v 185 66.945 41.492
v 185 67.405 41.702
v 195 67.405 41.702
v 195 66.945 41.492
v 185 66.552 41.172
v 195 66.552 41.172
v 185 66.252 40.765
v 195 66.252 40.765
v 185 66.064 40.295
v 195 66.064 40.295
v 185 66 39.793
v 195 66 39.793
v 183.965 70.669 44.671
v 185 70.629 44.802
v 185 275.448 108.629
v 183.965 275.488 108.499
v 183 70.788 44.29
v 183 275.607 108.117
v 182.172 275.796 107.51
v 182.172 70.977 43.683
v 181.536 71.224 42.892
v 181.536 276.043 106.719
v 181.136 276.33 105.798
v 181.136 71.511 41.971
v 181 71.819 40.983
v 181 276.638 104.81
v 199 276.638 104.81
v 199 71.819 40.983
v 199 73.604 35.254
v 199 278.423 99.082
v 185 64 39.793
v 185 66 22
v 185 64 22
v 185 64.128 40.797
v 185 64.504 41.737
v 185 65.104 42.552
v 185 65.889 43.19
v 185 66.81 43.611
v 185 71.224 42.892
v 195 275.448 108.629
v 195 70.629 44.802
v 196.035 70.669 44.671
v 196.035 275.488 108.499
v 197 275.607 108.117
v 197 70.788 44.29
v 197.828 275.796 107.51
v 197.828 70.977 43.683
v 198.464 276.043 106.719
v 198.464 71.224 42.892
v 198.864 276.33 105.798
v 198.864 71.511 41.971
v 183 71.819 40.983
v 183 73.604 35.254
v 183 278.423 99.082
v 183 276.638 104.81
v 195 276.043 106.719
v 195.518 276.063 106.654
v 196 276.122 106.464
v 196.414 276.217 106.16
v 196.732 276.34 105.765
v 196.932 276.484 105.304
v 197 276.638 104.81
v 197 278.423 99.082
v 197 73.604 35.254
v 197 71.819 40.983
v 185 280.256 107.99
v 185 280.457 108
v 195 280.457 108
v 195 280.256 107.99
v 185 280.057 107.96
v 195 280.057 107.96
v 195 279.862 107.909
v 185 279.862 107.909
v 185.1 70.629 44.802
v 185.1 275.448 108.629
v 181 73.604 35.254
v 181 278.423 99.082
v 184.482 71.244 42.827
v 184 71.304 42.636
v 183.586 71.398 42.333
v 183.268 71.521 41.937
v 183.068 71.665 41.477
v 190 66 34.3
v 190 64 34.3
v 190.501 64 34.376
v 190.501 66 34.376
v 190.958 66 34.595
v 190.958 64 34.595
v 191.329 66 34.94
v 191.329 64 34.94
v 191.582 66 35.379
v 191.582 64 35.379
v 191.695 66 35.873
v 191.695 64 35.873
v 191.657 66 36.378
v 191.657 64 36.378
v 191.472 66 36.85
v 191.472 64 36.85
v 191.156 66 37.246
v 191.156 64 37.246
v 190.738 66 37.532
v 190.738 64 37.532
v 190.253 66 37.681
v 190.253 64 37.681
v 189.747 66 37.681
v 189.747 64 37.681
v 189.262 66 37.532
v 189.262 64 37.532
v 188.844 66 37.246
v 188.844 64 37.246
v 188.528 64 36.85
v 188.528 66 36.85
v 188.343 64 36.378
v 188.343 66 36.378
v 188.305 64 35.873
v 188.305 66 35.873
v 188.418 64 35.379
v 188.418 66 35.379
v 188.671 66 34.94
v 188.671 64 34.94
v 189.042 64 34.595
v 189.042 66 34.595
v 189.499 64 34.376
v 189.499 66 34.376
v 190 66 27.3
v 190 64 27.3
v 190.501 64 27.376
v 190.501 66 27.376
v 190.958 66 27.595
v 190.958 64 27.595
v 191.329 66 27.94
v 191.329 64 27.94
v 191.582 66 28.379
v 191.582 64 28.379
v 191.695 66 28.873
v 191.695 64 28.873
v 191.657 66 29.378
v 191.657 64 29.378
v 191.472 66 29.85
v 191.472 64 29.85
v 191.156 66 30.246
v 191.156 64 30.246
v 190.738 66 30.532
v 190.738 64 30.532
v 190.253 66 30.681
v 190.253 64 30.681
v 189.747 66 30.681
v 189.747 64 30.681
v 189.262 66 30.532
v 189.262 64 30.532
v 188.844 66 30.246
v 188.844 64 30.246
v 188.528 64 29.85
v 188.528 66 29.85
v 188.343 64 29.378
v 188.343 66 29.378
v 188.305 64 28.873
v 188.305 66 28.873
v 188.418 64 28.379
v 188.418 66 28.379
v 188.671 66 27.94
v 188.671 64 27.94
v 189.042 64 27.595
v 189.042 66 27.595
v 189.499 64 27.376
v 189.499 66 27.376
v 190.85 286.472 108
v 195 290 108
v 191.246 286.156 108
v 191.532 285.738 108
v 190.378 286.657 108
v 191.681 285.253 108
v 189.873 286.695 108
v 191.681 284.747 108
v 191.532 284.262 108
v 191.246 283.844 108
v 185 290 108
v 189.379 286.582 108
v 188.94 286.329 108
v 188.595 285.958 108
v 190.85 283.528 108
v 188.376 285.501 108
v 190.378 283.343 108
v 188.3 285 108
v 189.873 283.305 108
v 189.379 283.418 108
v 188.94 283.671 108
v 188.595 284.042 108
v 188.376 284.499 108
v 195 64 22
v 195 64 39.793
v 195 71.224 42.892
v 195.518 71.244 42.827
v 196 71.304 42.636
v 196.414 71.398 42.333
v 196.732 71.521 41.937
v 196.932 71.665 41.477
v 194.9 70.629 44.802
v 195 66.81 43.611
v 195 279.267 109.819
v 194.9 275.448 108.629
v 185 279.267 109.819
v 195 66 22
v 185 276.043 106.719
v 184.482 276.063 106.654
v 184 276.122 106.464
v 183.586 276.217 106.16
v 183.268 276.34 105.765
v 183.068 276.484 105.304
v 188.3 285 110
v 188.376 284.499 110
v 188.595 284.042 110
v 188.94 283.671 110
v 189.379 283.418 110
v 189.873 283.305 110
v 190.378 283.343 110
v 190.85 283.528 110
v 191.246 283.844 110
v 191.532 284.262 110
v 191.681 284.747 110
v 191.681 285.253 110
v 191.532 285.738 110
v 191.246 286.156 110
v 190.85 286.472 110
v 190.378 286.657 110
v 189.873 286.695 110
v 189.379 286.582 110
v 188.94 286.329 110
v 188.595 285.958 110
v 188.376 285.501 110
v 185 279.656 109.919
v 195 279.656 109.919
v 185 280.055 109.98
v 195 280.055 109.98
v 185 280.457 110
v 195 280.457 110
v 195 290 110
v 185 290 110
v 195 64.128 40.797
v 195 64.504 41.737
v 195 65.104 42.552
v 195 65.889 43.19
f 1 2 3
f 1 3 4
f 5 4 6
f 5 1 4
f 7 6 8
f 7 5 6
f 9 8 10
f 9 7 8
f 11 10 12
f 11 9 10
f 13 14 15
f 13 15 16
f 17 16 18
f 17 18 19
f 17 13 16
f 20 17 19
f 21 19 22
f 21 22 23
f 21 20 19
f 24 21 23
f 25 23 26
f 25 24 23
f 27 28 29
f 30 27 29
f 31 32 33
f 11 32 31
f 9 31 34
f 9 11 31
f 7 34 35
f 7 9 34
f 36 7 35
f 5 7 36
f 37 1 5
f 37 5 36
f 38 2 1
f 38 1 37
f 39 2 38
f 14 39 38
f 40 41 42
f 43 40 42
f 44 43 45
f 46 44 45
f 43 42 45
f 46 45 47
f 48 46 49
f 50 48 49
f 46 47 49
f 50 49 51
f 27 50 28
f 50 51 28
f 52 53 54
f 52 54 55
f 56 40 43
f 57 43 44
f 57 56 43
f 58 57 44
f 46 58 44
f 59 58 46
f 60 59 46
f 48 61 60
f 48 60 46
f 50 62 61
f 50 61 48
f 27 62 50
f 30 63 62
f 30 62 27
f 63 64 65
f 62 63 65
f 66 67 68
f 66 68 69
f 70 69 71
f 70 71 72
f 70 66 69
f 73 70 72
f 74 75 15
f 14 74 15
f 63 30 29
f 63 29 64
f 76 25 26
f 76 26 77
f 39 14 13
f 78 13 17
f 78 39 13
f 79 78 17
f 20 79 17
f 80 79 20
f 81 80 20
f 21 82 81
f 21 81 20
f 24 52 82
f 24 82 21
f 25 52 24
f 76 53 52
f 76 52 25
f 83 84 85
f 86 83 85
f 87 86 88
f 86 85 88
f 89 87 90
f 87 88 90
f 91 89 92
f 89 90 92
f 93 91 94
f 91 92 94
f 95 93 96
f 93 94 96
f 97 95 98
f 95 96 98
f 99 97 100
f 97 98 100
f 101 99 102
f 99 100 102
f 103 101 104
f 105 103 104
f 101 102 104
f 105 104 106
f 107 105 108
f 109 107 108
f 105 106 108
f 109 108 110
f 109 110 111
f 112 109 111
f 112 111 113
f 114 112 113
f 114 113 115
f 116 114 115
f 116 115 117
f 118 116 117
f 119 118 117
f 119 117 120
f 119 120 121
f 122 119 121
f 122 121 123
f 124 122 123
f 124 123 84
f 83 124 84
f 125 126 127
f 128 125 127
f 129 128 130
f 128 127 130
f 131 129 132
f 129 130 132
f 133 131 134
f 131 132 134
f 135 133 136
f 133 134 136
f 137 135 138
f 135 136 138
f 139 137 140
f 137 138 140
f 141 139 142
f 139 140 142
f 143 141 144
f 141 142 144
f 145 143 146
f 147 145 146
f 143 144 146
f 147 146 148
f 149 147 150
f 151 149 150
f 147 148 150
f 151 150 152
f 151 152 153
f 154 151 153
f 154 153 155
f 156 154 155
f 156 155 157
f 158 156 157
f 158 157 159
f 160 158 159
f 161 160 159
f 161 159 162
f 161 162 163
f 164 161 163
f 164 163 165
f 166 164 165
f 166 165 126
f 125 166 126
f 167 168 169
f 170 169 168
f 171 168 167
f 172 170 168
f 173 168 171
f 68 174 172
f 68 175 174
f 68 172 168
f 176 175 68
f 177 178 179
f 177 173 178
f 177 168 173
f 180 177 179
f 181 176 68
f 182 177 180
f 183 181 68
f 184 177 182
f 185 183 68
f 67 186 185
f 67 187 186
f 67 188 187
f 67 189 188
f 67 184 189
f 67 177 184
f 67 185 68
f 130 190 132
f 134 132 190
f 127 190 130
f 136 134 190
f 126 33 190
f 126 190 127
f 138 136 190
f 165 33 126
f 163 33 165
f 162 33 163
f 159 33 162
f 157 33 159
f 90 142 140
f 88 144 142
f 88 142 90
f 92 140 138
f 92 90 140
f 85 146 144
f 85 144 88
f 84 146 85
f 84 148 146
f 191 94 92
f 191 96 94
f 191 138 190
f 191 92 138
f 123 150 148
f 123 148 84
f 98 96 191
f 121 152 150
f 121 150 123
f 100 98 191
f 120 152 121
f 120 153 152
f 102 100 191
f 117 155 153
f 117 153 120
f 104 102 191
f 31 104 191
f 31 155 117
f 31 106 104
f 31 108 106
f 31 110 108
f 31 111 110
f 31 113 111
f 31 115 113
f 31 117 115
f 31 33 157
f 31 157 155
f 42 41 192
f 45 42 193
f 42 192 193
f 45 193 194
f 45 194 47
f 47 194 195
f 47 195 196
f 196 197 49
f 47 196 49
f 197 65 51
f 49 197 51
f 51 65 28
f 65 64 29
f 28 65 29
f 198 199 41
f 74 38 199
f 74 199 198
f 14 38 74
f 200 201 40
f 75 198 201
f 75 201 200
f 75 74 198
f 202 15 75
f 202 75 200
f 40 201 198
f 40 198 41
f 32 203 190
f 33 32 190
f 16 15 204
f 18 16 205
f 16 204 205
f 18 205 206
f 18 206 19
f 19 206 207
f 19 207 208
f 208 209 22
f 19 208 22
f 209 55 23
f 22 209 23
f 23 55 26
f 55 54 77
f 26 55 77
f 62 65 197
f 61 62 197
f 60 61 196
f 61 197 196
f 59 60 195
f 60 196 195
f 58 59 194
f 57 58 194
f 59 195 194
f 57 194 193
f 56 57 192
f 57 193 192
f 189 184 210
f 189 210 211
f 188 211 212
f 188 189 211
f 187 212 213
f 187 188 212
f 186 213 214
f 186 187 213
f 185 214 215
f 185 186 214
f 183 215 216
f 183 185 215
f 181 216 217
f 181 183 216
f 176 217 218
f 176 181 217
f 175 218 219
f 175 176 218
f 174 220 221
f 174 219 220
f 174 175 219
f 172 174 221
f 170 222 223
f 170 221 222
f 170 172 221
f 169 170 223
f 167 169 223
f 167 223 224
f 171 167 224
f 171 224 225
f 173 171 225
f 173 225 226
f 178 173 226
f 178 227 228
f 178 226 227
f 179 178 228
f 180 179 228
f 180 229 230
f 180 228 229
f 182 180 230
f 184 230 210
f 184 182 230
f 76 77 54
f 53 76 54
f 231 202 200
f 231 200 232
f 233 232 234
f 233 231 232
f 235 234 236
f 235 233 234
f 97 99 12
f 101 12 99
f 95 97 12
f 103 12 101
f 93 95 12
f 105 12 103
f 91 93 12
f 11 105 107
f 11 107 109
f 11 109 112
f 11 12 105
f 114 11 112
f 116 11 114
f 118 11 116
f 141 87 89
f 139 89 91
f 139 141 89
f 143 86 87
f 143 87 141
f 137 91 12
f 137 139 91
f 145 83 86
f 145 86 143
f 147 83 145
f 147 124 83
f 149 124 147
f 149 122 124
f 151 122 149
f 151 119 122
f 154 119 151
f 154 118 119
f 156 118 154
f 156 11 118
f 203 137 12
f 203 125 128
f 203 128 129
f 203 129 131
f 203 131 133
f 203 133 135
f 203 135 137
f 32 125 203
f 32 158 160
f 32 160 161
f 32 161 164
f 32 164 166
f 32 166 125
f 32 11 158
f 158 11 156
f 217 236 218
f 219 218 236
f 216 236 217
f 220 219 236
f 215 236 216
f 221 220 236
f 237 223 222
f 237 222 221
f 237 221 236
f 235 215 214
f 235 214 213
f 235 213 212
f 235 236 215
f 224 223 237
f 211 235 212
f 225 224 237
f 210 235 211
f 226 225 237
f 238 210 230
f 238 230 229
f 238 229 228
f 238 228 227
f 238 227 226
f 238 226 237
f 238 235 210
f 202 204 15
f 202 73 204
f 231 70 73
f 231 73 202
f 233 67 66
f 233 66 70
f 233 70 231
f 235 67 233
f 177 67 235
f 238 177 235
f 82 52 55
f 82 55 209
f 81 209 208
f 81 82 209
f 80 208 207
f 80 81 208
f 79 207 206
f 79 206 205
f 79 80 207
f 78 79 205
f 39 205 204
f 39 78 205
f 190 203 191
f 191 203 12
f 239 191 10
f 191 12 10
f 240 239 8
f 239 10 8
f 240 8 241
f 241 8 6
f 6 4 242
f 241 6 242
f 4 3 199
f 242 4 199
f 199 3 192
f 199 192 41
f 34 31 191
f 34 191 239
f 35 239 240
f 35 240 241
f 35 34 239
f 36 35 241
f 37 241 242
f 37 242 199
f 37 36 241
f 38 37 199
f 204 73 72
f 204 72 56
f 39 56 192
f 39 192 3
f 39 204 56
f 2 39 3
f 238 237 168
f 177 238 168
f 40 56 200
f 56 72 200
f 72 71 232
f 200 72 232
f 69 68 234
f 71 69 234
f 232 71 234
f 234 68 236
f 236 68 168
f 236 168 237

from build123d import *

# Parameters (mm, degrees)
FORMED_WEB_DEPTH           = 10
EDGE_STIFFENING_LIPS_DEPTH = 214.533668262
WALL_MOUNT_HOLE_SKETCH_R   = 1.7
WALL_MOUNT_HOLES_DEPTH     = 2.4
COVER_MOUNT_HOLE_SKETCH_R  = 1.7
COVER_MOUNT_HOLE_DEPTH     = 2.4


with BuildPart() as part:
    # Formed Web Section Sketch → Formed Web (new body)
    with BuildSketch(Plane(origin=(185, 0, 0), x_dir=(0, 0, -1), z_dir=(1, 0, 0))):
        with BuildLine():
            Line((-22, 64), (-39.792590359, 64))
            ThreePointArc((-39.792590359, 64), (-42.163216653, 64.778178935), (-43.611457224, 66.809934512))
            Line((-43.611457224, 66.809934512), (-109.818866865, 279.266547538))
            ThreePointArc((-109.818866865, 279.266547538), (-109.954457451, 279.854727432), (-110, 280.456613027))
            Line((-110, 280.456613027), (-110, 290))
            Line((-110, 290), (-108, 290))
            Line((-108, 290), (-108, 280.456613027))
            ThreePointArc((-108, 280.456613027), (-107.977228725, 280.155670229), (-107.909433433, 279.861580283))
            Line((-107.909433433, 279.861580283), (-41.702023792, 67.404967256))
            ThreePointArc((-41.702023792, 67.404967256), (-40.977903506, 66.389089467), (-39.792590359, 66))
            Line((-39.792590359, 66), (-22, 66))
            Line((-22, 66), (-22, 64))
        make_face()
    extrude(amount=FORMED_WEB_DEPTH)

    # Edge Lip Sketch → Edge Stiffening Lips (add)
    with BuildSketch(Plane(origin=(0, 77.102620151, 24.02732814), x_dir=(-1, 0, 0), z_dir=(0, -0.9547167162884552, -0.297516372052681))):
        with BuildLine():
            Line((-181, -17.759537901), (-181, -11.759537901))
            Line((-181, -11.759537901), (-183, -11.759537901))
            Line((-183, -11.759537901), (-183, -17.759537901))
            ThreePointArc((-183, -17.759537901), (-183.585786438, -19.173751463), (-185, -19.759537901))
            Line((-185, -19.759537901), (-185.1, -19.759537901))
            Line((-185.1, -19.759537901), (-185.1, -21.759537901))
            Line((-185.1, -21.759537901), (-185, -21.759537901))
            ThreePointArc((-185, -21.759537901), (-182.171572875, -20.587965025), (-181, -17.759537901))
        make_face()
        with BuildLine():
            Line((-199, -17.759537901), (-199, -11.759537901))
            Line((-199, -11.759537901), (-197, -11.759537901))
            Line((-197, -11.759537901), (-197, -17.759537901))
            ThreePointArc((-197, -17.759537901), (-196.414213562, -19.173751463), (-195, -19.759537901))
            Line((-195, -19.759537901), (-194.9, -19.759537901))
            Line((-194.9, -19.759537901), (-194.9, -21.759537901))
            Line((-194.9, -21.759537901), (-195, -21.759537901))
            ThreePointArc((-195, -21.759537901), (-197.828427125, -20.587965025), (-199, -17.759537901))
        make_face()
    extrude(amount=-EDGE_STIFFENING_LIPS_DEPTH)

    # Wall Mount Hole Sketch → Wall Mount Holes (cut)
    with BuildSketch(Plane(origin=(0, 63.8, 0), x_dir=(-1, 0, 0), z_dir=(0, -1, 0))):
        with Locations(Location((-190, -29, 0), (0, 0, 90))):
            Circle(WALL_MOUNT_HOLE_SKETCH_R)
        with Locations(Location((-190, -36, 0), (0, 0, 90))):
            Circle(WALL_MOUNT_HOLE_SKETCH_R)
    extrude(amount=-WALL_MOUNT_HOLES_DEPTH, mode=Mode.SUBTRACT)

    # Cover Mount Hole Sketch → Cover Mount Hole (cut)
    with BuildSketch(Plane.XY.offset(107.8)):
        with Locations(Location((190, 285, 0), (0, 0, 180))):
            Circle(COVER_MOUNT_HOLE_SKETCH_R)
    extrude(amount=COVER_MOUNT_HOLE_DEPTH, mode=Mode.SUBTRACT)


solid = part.part
